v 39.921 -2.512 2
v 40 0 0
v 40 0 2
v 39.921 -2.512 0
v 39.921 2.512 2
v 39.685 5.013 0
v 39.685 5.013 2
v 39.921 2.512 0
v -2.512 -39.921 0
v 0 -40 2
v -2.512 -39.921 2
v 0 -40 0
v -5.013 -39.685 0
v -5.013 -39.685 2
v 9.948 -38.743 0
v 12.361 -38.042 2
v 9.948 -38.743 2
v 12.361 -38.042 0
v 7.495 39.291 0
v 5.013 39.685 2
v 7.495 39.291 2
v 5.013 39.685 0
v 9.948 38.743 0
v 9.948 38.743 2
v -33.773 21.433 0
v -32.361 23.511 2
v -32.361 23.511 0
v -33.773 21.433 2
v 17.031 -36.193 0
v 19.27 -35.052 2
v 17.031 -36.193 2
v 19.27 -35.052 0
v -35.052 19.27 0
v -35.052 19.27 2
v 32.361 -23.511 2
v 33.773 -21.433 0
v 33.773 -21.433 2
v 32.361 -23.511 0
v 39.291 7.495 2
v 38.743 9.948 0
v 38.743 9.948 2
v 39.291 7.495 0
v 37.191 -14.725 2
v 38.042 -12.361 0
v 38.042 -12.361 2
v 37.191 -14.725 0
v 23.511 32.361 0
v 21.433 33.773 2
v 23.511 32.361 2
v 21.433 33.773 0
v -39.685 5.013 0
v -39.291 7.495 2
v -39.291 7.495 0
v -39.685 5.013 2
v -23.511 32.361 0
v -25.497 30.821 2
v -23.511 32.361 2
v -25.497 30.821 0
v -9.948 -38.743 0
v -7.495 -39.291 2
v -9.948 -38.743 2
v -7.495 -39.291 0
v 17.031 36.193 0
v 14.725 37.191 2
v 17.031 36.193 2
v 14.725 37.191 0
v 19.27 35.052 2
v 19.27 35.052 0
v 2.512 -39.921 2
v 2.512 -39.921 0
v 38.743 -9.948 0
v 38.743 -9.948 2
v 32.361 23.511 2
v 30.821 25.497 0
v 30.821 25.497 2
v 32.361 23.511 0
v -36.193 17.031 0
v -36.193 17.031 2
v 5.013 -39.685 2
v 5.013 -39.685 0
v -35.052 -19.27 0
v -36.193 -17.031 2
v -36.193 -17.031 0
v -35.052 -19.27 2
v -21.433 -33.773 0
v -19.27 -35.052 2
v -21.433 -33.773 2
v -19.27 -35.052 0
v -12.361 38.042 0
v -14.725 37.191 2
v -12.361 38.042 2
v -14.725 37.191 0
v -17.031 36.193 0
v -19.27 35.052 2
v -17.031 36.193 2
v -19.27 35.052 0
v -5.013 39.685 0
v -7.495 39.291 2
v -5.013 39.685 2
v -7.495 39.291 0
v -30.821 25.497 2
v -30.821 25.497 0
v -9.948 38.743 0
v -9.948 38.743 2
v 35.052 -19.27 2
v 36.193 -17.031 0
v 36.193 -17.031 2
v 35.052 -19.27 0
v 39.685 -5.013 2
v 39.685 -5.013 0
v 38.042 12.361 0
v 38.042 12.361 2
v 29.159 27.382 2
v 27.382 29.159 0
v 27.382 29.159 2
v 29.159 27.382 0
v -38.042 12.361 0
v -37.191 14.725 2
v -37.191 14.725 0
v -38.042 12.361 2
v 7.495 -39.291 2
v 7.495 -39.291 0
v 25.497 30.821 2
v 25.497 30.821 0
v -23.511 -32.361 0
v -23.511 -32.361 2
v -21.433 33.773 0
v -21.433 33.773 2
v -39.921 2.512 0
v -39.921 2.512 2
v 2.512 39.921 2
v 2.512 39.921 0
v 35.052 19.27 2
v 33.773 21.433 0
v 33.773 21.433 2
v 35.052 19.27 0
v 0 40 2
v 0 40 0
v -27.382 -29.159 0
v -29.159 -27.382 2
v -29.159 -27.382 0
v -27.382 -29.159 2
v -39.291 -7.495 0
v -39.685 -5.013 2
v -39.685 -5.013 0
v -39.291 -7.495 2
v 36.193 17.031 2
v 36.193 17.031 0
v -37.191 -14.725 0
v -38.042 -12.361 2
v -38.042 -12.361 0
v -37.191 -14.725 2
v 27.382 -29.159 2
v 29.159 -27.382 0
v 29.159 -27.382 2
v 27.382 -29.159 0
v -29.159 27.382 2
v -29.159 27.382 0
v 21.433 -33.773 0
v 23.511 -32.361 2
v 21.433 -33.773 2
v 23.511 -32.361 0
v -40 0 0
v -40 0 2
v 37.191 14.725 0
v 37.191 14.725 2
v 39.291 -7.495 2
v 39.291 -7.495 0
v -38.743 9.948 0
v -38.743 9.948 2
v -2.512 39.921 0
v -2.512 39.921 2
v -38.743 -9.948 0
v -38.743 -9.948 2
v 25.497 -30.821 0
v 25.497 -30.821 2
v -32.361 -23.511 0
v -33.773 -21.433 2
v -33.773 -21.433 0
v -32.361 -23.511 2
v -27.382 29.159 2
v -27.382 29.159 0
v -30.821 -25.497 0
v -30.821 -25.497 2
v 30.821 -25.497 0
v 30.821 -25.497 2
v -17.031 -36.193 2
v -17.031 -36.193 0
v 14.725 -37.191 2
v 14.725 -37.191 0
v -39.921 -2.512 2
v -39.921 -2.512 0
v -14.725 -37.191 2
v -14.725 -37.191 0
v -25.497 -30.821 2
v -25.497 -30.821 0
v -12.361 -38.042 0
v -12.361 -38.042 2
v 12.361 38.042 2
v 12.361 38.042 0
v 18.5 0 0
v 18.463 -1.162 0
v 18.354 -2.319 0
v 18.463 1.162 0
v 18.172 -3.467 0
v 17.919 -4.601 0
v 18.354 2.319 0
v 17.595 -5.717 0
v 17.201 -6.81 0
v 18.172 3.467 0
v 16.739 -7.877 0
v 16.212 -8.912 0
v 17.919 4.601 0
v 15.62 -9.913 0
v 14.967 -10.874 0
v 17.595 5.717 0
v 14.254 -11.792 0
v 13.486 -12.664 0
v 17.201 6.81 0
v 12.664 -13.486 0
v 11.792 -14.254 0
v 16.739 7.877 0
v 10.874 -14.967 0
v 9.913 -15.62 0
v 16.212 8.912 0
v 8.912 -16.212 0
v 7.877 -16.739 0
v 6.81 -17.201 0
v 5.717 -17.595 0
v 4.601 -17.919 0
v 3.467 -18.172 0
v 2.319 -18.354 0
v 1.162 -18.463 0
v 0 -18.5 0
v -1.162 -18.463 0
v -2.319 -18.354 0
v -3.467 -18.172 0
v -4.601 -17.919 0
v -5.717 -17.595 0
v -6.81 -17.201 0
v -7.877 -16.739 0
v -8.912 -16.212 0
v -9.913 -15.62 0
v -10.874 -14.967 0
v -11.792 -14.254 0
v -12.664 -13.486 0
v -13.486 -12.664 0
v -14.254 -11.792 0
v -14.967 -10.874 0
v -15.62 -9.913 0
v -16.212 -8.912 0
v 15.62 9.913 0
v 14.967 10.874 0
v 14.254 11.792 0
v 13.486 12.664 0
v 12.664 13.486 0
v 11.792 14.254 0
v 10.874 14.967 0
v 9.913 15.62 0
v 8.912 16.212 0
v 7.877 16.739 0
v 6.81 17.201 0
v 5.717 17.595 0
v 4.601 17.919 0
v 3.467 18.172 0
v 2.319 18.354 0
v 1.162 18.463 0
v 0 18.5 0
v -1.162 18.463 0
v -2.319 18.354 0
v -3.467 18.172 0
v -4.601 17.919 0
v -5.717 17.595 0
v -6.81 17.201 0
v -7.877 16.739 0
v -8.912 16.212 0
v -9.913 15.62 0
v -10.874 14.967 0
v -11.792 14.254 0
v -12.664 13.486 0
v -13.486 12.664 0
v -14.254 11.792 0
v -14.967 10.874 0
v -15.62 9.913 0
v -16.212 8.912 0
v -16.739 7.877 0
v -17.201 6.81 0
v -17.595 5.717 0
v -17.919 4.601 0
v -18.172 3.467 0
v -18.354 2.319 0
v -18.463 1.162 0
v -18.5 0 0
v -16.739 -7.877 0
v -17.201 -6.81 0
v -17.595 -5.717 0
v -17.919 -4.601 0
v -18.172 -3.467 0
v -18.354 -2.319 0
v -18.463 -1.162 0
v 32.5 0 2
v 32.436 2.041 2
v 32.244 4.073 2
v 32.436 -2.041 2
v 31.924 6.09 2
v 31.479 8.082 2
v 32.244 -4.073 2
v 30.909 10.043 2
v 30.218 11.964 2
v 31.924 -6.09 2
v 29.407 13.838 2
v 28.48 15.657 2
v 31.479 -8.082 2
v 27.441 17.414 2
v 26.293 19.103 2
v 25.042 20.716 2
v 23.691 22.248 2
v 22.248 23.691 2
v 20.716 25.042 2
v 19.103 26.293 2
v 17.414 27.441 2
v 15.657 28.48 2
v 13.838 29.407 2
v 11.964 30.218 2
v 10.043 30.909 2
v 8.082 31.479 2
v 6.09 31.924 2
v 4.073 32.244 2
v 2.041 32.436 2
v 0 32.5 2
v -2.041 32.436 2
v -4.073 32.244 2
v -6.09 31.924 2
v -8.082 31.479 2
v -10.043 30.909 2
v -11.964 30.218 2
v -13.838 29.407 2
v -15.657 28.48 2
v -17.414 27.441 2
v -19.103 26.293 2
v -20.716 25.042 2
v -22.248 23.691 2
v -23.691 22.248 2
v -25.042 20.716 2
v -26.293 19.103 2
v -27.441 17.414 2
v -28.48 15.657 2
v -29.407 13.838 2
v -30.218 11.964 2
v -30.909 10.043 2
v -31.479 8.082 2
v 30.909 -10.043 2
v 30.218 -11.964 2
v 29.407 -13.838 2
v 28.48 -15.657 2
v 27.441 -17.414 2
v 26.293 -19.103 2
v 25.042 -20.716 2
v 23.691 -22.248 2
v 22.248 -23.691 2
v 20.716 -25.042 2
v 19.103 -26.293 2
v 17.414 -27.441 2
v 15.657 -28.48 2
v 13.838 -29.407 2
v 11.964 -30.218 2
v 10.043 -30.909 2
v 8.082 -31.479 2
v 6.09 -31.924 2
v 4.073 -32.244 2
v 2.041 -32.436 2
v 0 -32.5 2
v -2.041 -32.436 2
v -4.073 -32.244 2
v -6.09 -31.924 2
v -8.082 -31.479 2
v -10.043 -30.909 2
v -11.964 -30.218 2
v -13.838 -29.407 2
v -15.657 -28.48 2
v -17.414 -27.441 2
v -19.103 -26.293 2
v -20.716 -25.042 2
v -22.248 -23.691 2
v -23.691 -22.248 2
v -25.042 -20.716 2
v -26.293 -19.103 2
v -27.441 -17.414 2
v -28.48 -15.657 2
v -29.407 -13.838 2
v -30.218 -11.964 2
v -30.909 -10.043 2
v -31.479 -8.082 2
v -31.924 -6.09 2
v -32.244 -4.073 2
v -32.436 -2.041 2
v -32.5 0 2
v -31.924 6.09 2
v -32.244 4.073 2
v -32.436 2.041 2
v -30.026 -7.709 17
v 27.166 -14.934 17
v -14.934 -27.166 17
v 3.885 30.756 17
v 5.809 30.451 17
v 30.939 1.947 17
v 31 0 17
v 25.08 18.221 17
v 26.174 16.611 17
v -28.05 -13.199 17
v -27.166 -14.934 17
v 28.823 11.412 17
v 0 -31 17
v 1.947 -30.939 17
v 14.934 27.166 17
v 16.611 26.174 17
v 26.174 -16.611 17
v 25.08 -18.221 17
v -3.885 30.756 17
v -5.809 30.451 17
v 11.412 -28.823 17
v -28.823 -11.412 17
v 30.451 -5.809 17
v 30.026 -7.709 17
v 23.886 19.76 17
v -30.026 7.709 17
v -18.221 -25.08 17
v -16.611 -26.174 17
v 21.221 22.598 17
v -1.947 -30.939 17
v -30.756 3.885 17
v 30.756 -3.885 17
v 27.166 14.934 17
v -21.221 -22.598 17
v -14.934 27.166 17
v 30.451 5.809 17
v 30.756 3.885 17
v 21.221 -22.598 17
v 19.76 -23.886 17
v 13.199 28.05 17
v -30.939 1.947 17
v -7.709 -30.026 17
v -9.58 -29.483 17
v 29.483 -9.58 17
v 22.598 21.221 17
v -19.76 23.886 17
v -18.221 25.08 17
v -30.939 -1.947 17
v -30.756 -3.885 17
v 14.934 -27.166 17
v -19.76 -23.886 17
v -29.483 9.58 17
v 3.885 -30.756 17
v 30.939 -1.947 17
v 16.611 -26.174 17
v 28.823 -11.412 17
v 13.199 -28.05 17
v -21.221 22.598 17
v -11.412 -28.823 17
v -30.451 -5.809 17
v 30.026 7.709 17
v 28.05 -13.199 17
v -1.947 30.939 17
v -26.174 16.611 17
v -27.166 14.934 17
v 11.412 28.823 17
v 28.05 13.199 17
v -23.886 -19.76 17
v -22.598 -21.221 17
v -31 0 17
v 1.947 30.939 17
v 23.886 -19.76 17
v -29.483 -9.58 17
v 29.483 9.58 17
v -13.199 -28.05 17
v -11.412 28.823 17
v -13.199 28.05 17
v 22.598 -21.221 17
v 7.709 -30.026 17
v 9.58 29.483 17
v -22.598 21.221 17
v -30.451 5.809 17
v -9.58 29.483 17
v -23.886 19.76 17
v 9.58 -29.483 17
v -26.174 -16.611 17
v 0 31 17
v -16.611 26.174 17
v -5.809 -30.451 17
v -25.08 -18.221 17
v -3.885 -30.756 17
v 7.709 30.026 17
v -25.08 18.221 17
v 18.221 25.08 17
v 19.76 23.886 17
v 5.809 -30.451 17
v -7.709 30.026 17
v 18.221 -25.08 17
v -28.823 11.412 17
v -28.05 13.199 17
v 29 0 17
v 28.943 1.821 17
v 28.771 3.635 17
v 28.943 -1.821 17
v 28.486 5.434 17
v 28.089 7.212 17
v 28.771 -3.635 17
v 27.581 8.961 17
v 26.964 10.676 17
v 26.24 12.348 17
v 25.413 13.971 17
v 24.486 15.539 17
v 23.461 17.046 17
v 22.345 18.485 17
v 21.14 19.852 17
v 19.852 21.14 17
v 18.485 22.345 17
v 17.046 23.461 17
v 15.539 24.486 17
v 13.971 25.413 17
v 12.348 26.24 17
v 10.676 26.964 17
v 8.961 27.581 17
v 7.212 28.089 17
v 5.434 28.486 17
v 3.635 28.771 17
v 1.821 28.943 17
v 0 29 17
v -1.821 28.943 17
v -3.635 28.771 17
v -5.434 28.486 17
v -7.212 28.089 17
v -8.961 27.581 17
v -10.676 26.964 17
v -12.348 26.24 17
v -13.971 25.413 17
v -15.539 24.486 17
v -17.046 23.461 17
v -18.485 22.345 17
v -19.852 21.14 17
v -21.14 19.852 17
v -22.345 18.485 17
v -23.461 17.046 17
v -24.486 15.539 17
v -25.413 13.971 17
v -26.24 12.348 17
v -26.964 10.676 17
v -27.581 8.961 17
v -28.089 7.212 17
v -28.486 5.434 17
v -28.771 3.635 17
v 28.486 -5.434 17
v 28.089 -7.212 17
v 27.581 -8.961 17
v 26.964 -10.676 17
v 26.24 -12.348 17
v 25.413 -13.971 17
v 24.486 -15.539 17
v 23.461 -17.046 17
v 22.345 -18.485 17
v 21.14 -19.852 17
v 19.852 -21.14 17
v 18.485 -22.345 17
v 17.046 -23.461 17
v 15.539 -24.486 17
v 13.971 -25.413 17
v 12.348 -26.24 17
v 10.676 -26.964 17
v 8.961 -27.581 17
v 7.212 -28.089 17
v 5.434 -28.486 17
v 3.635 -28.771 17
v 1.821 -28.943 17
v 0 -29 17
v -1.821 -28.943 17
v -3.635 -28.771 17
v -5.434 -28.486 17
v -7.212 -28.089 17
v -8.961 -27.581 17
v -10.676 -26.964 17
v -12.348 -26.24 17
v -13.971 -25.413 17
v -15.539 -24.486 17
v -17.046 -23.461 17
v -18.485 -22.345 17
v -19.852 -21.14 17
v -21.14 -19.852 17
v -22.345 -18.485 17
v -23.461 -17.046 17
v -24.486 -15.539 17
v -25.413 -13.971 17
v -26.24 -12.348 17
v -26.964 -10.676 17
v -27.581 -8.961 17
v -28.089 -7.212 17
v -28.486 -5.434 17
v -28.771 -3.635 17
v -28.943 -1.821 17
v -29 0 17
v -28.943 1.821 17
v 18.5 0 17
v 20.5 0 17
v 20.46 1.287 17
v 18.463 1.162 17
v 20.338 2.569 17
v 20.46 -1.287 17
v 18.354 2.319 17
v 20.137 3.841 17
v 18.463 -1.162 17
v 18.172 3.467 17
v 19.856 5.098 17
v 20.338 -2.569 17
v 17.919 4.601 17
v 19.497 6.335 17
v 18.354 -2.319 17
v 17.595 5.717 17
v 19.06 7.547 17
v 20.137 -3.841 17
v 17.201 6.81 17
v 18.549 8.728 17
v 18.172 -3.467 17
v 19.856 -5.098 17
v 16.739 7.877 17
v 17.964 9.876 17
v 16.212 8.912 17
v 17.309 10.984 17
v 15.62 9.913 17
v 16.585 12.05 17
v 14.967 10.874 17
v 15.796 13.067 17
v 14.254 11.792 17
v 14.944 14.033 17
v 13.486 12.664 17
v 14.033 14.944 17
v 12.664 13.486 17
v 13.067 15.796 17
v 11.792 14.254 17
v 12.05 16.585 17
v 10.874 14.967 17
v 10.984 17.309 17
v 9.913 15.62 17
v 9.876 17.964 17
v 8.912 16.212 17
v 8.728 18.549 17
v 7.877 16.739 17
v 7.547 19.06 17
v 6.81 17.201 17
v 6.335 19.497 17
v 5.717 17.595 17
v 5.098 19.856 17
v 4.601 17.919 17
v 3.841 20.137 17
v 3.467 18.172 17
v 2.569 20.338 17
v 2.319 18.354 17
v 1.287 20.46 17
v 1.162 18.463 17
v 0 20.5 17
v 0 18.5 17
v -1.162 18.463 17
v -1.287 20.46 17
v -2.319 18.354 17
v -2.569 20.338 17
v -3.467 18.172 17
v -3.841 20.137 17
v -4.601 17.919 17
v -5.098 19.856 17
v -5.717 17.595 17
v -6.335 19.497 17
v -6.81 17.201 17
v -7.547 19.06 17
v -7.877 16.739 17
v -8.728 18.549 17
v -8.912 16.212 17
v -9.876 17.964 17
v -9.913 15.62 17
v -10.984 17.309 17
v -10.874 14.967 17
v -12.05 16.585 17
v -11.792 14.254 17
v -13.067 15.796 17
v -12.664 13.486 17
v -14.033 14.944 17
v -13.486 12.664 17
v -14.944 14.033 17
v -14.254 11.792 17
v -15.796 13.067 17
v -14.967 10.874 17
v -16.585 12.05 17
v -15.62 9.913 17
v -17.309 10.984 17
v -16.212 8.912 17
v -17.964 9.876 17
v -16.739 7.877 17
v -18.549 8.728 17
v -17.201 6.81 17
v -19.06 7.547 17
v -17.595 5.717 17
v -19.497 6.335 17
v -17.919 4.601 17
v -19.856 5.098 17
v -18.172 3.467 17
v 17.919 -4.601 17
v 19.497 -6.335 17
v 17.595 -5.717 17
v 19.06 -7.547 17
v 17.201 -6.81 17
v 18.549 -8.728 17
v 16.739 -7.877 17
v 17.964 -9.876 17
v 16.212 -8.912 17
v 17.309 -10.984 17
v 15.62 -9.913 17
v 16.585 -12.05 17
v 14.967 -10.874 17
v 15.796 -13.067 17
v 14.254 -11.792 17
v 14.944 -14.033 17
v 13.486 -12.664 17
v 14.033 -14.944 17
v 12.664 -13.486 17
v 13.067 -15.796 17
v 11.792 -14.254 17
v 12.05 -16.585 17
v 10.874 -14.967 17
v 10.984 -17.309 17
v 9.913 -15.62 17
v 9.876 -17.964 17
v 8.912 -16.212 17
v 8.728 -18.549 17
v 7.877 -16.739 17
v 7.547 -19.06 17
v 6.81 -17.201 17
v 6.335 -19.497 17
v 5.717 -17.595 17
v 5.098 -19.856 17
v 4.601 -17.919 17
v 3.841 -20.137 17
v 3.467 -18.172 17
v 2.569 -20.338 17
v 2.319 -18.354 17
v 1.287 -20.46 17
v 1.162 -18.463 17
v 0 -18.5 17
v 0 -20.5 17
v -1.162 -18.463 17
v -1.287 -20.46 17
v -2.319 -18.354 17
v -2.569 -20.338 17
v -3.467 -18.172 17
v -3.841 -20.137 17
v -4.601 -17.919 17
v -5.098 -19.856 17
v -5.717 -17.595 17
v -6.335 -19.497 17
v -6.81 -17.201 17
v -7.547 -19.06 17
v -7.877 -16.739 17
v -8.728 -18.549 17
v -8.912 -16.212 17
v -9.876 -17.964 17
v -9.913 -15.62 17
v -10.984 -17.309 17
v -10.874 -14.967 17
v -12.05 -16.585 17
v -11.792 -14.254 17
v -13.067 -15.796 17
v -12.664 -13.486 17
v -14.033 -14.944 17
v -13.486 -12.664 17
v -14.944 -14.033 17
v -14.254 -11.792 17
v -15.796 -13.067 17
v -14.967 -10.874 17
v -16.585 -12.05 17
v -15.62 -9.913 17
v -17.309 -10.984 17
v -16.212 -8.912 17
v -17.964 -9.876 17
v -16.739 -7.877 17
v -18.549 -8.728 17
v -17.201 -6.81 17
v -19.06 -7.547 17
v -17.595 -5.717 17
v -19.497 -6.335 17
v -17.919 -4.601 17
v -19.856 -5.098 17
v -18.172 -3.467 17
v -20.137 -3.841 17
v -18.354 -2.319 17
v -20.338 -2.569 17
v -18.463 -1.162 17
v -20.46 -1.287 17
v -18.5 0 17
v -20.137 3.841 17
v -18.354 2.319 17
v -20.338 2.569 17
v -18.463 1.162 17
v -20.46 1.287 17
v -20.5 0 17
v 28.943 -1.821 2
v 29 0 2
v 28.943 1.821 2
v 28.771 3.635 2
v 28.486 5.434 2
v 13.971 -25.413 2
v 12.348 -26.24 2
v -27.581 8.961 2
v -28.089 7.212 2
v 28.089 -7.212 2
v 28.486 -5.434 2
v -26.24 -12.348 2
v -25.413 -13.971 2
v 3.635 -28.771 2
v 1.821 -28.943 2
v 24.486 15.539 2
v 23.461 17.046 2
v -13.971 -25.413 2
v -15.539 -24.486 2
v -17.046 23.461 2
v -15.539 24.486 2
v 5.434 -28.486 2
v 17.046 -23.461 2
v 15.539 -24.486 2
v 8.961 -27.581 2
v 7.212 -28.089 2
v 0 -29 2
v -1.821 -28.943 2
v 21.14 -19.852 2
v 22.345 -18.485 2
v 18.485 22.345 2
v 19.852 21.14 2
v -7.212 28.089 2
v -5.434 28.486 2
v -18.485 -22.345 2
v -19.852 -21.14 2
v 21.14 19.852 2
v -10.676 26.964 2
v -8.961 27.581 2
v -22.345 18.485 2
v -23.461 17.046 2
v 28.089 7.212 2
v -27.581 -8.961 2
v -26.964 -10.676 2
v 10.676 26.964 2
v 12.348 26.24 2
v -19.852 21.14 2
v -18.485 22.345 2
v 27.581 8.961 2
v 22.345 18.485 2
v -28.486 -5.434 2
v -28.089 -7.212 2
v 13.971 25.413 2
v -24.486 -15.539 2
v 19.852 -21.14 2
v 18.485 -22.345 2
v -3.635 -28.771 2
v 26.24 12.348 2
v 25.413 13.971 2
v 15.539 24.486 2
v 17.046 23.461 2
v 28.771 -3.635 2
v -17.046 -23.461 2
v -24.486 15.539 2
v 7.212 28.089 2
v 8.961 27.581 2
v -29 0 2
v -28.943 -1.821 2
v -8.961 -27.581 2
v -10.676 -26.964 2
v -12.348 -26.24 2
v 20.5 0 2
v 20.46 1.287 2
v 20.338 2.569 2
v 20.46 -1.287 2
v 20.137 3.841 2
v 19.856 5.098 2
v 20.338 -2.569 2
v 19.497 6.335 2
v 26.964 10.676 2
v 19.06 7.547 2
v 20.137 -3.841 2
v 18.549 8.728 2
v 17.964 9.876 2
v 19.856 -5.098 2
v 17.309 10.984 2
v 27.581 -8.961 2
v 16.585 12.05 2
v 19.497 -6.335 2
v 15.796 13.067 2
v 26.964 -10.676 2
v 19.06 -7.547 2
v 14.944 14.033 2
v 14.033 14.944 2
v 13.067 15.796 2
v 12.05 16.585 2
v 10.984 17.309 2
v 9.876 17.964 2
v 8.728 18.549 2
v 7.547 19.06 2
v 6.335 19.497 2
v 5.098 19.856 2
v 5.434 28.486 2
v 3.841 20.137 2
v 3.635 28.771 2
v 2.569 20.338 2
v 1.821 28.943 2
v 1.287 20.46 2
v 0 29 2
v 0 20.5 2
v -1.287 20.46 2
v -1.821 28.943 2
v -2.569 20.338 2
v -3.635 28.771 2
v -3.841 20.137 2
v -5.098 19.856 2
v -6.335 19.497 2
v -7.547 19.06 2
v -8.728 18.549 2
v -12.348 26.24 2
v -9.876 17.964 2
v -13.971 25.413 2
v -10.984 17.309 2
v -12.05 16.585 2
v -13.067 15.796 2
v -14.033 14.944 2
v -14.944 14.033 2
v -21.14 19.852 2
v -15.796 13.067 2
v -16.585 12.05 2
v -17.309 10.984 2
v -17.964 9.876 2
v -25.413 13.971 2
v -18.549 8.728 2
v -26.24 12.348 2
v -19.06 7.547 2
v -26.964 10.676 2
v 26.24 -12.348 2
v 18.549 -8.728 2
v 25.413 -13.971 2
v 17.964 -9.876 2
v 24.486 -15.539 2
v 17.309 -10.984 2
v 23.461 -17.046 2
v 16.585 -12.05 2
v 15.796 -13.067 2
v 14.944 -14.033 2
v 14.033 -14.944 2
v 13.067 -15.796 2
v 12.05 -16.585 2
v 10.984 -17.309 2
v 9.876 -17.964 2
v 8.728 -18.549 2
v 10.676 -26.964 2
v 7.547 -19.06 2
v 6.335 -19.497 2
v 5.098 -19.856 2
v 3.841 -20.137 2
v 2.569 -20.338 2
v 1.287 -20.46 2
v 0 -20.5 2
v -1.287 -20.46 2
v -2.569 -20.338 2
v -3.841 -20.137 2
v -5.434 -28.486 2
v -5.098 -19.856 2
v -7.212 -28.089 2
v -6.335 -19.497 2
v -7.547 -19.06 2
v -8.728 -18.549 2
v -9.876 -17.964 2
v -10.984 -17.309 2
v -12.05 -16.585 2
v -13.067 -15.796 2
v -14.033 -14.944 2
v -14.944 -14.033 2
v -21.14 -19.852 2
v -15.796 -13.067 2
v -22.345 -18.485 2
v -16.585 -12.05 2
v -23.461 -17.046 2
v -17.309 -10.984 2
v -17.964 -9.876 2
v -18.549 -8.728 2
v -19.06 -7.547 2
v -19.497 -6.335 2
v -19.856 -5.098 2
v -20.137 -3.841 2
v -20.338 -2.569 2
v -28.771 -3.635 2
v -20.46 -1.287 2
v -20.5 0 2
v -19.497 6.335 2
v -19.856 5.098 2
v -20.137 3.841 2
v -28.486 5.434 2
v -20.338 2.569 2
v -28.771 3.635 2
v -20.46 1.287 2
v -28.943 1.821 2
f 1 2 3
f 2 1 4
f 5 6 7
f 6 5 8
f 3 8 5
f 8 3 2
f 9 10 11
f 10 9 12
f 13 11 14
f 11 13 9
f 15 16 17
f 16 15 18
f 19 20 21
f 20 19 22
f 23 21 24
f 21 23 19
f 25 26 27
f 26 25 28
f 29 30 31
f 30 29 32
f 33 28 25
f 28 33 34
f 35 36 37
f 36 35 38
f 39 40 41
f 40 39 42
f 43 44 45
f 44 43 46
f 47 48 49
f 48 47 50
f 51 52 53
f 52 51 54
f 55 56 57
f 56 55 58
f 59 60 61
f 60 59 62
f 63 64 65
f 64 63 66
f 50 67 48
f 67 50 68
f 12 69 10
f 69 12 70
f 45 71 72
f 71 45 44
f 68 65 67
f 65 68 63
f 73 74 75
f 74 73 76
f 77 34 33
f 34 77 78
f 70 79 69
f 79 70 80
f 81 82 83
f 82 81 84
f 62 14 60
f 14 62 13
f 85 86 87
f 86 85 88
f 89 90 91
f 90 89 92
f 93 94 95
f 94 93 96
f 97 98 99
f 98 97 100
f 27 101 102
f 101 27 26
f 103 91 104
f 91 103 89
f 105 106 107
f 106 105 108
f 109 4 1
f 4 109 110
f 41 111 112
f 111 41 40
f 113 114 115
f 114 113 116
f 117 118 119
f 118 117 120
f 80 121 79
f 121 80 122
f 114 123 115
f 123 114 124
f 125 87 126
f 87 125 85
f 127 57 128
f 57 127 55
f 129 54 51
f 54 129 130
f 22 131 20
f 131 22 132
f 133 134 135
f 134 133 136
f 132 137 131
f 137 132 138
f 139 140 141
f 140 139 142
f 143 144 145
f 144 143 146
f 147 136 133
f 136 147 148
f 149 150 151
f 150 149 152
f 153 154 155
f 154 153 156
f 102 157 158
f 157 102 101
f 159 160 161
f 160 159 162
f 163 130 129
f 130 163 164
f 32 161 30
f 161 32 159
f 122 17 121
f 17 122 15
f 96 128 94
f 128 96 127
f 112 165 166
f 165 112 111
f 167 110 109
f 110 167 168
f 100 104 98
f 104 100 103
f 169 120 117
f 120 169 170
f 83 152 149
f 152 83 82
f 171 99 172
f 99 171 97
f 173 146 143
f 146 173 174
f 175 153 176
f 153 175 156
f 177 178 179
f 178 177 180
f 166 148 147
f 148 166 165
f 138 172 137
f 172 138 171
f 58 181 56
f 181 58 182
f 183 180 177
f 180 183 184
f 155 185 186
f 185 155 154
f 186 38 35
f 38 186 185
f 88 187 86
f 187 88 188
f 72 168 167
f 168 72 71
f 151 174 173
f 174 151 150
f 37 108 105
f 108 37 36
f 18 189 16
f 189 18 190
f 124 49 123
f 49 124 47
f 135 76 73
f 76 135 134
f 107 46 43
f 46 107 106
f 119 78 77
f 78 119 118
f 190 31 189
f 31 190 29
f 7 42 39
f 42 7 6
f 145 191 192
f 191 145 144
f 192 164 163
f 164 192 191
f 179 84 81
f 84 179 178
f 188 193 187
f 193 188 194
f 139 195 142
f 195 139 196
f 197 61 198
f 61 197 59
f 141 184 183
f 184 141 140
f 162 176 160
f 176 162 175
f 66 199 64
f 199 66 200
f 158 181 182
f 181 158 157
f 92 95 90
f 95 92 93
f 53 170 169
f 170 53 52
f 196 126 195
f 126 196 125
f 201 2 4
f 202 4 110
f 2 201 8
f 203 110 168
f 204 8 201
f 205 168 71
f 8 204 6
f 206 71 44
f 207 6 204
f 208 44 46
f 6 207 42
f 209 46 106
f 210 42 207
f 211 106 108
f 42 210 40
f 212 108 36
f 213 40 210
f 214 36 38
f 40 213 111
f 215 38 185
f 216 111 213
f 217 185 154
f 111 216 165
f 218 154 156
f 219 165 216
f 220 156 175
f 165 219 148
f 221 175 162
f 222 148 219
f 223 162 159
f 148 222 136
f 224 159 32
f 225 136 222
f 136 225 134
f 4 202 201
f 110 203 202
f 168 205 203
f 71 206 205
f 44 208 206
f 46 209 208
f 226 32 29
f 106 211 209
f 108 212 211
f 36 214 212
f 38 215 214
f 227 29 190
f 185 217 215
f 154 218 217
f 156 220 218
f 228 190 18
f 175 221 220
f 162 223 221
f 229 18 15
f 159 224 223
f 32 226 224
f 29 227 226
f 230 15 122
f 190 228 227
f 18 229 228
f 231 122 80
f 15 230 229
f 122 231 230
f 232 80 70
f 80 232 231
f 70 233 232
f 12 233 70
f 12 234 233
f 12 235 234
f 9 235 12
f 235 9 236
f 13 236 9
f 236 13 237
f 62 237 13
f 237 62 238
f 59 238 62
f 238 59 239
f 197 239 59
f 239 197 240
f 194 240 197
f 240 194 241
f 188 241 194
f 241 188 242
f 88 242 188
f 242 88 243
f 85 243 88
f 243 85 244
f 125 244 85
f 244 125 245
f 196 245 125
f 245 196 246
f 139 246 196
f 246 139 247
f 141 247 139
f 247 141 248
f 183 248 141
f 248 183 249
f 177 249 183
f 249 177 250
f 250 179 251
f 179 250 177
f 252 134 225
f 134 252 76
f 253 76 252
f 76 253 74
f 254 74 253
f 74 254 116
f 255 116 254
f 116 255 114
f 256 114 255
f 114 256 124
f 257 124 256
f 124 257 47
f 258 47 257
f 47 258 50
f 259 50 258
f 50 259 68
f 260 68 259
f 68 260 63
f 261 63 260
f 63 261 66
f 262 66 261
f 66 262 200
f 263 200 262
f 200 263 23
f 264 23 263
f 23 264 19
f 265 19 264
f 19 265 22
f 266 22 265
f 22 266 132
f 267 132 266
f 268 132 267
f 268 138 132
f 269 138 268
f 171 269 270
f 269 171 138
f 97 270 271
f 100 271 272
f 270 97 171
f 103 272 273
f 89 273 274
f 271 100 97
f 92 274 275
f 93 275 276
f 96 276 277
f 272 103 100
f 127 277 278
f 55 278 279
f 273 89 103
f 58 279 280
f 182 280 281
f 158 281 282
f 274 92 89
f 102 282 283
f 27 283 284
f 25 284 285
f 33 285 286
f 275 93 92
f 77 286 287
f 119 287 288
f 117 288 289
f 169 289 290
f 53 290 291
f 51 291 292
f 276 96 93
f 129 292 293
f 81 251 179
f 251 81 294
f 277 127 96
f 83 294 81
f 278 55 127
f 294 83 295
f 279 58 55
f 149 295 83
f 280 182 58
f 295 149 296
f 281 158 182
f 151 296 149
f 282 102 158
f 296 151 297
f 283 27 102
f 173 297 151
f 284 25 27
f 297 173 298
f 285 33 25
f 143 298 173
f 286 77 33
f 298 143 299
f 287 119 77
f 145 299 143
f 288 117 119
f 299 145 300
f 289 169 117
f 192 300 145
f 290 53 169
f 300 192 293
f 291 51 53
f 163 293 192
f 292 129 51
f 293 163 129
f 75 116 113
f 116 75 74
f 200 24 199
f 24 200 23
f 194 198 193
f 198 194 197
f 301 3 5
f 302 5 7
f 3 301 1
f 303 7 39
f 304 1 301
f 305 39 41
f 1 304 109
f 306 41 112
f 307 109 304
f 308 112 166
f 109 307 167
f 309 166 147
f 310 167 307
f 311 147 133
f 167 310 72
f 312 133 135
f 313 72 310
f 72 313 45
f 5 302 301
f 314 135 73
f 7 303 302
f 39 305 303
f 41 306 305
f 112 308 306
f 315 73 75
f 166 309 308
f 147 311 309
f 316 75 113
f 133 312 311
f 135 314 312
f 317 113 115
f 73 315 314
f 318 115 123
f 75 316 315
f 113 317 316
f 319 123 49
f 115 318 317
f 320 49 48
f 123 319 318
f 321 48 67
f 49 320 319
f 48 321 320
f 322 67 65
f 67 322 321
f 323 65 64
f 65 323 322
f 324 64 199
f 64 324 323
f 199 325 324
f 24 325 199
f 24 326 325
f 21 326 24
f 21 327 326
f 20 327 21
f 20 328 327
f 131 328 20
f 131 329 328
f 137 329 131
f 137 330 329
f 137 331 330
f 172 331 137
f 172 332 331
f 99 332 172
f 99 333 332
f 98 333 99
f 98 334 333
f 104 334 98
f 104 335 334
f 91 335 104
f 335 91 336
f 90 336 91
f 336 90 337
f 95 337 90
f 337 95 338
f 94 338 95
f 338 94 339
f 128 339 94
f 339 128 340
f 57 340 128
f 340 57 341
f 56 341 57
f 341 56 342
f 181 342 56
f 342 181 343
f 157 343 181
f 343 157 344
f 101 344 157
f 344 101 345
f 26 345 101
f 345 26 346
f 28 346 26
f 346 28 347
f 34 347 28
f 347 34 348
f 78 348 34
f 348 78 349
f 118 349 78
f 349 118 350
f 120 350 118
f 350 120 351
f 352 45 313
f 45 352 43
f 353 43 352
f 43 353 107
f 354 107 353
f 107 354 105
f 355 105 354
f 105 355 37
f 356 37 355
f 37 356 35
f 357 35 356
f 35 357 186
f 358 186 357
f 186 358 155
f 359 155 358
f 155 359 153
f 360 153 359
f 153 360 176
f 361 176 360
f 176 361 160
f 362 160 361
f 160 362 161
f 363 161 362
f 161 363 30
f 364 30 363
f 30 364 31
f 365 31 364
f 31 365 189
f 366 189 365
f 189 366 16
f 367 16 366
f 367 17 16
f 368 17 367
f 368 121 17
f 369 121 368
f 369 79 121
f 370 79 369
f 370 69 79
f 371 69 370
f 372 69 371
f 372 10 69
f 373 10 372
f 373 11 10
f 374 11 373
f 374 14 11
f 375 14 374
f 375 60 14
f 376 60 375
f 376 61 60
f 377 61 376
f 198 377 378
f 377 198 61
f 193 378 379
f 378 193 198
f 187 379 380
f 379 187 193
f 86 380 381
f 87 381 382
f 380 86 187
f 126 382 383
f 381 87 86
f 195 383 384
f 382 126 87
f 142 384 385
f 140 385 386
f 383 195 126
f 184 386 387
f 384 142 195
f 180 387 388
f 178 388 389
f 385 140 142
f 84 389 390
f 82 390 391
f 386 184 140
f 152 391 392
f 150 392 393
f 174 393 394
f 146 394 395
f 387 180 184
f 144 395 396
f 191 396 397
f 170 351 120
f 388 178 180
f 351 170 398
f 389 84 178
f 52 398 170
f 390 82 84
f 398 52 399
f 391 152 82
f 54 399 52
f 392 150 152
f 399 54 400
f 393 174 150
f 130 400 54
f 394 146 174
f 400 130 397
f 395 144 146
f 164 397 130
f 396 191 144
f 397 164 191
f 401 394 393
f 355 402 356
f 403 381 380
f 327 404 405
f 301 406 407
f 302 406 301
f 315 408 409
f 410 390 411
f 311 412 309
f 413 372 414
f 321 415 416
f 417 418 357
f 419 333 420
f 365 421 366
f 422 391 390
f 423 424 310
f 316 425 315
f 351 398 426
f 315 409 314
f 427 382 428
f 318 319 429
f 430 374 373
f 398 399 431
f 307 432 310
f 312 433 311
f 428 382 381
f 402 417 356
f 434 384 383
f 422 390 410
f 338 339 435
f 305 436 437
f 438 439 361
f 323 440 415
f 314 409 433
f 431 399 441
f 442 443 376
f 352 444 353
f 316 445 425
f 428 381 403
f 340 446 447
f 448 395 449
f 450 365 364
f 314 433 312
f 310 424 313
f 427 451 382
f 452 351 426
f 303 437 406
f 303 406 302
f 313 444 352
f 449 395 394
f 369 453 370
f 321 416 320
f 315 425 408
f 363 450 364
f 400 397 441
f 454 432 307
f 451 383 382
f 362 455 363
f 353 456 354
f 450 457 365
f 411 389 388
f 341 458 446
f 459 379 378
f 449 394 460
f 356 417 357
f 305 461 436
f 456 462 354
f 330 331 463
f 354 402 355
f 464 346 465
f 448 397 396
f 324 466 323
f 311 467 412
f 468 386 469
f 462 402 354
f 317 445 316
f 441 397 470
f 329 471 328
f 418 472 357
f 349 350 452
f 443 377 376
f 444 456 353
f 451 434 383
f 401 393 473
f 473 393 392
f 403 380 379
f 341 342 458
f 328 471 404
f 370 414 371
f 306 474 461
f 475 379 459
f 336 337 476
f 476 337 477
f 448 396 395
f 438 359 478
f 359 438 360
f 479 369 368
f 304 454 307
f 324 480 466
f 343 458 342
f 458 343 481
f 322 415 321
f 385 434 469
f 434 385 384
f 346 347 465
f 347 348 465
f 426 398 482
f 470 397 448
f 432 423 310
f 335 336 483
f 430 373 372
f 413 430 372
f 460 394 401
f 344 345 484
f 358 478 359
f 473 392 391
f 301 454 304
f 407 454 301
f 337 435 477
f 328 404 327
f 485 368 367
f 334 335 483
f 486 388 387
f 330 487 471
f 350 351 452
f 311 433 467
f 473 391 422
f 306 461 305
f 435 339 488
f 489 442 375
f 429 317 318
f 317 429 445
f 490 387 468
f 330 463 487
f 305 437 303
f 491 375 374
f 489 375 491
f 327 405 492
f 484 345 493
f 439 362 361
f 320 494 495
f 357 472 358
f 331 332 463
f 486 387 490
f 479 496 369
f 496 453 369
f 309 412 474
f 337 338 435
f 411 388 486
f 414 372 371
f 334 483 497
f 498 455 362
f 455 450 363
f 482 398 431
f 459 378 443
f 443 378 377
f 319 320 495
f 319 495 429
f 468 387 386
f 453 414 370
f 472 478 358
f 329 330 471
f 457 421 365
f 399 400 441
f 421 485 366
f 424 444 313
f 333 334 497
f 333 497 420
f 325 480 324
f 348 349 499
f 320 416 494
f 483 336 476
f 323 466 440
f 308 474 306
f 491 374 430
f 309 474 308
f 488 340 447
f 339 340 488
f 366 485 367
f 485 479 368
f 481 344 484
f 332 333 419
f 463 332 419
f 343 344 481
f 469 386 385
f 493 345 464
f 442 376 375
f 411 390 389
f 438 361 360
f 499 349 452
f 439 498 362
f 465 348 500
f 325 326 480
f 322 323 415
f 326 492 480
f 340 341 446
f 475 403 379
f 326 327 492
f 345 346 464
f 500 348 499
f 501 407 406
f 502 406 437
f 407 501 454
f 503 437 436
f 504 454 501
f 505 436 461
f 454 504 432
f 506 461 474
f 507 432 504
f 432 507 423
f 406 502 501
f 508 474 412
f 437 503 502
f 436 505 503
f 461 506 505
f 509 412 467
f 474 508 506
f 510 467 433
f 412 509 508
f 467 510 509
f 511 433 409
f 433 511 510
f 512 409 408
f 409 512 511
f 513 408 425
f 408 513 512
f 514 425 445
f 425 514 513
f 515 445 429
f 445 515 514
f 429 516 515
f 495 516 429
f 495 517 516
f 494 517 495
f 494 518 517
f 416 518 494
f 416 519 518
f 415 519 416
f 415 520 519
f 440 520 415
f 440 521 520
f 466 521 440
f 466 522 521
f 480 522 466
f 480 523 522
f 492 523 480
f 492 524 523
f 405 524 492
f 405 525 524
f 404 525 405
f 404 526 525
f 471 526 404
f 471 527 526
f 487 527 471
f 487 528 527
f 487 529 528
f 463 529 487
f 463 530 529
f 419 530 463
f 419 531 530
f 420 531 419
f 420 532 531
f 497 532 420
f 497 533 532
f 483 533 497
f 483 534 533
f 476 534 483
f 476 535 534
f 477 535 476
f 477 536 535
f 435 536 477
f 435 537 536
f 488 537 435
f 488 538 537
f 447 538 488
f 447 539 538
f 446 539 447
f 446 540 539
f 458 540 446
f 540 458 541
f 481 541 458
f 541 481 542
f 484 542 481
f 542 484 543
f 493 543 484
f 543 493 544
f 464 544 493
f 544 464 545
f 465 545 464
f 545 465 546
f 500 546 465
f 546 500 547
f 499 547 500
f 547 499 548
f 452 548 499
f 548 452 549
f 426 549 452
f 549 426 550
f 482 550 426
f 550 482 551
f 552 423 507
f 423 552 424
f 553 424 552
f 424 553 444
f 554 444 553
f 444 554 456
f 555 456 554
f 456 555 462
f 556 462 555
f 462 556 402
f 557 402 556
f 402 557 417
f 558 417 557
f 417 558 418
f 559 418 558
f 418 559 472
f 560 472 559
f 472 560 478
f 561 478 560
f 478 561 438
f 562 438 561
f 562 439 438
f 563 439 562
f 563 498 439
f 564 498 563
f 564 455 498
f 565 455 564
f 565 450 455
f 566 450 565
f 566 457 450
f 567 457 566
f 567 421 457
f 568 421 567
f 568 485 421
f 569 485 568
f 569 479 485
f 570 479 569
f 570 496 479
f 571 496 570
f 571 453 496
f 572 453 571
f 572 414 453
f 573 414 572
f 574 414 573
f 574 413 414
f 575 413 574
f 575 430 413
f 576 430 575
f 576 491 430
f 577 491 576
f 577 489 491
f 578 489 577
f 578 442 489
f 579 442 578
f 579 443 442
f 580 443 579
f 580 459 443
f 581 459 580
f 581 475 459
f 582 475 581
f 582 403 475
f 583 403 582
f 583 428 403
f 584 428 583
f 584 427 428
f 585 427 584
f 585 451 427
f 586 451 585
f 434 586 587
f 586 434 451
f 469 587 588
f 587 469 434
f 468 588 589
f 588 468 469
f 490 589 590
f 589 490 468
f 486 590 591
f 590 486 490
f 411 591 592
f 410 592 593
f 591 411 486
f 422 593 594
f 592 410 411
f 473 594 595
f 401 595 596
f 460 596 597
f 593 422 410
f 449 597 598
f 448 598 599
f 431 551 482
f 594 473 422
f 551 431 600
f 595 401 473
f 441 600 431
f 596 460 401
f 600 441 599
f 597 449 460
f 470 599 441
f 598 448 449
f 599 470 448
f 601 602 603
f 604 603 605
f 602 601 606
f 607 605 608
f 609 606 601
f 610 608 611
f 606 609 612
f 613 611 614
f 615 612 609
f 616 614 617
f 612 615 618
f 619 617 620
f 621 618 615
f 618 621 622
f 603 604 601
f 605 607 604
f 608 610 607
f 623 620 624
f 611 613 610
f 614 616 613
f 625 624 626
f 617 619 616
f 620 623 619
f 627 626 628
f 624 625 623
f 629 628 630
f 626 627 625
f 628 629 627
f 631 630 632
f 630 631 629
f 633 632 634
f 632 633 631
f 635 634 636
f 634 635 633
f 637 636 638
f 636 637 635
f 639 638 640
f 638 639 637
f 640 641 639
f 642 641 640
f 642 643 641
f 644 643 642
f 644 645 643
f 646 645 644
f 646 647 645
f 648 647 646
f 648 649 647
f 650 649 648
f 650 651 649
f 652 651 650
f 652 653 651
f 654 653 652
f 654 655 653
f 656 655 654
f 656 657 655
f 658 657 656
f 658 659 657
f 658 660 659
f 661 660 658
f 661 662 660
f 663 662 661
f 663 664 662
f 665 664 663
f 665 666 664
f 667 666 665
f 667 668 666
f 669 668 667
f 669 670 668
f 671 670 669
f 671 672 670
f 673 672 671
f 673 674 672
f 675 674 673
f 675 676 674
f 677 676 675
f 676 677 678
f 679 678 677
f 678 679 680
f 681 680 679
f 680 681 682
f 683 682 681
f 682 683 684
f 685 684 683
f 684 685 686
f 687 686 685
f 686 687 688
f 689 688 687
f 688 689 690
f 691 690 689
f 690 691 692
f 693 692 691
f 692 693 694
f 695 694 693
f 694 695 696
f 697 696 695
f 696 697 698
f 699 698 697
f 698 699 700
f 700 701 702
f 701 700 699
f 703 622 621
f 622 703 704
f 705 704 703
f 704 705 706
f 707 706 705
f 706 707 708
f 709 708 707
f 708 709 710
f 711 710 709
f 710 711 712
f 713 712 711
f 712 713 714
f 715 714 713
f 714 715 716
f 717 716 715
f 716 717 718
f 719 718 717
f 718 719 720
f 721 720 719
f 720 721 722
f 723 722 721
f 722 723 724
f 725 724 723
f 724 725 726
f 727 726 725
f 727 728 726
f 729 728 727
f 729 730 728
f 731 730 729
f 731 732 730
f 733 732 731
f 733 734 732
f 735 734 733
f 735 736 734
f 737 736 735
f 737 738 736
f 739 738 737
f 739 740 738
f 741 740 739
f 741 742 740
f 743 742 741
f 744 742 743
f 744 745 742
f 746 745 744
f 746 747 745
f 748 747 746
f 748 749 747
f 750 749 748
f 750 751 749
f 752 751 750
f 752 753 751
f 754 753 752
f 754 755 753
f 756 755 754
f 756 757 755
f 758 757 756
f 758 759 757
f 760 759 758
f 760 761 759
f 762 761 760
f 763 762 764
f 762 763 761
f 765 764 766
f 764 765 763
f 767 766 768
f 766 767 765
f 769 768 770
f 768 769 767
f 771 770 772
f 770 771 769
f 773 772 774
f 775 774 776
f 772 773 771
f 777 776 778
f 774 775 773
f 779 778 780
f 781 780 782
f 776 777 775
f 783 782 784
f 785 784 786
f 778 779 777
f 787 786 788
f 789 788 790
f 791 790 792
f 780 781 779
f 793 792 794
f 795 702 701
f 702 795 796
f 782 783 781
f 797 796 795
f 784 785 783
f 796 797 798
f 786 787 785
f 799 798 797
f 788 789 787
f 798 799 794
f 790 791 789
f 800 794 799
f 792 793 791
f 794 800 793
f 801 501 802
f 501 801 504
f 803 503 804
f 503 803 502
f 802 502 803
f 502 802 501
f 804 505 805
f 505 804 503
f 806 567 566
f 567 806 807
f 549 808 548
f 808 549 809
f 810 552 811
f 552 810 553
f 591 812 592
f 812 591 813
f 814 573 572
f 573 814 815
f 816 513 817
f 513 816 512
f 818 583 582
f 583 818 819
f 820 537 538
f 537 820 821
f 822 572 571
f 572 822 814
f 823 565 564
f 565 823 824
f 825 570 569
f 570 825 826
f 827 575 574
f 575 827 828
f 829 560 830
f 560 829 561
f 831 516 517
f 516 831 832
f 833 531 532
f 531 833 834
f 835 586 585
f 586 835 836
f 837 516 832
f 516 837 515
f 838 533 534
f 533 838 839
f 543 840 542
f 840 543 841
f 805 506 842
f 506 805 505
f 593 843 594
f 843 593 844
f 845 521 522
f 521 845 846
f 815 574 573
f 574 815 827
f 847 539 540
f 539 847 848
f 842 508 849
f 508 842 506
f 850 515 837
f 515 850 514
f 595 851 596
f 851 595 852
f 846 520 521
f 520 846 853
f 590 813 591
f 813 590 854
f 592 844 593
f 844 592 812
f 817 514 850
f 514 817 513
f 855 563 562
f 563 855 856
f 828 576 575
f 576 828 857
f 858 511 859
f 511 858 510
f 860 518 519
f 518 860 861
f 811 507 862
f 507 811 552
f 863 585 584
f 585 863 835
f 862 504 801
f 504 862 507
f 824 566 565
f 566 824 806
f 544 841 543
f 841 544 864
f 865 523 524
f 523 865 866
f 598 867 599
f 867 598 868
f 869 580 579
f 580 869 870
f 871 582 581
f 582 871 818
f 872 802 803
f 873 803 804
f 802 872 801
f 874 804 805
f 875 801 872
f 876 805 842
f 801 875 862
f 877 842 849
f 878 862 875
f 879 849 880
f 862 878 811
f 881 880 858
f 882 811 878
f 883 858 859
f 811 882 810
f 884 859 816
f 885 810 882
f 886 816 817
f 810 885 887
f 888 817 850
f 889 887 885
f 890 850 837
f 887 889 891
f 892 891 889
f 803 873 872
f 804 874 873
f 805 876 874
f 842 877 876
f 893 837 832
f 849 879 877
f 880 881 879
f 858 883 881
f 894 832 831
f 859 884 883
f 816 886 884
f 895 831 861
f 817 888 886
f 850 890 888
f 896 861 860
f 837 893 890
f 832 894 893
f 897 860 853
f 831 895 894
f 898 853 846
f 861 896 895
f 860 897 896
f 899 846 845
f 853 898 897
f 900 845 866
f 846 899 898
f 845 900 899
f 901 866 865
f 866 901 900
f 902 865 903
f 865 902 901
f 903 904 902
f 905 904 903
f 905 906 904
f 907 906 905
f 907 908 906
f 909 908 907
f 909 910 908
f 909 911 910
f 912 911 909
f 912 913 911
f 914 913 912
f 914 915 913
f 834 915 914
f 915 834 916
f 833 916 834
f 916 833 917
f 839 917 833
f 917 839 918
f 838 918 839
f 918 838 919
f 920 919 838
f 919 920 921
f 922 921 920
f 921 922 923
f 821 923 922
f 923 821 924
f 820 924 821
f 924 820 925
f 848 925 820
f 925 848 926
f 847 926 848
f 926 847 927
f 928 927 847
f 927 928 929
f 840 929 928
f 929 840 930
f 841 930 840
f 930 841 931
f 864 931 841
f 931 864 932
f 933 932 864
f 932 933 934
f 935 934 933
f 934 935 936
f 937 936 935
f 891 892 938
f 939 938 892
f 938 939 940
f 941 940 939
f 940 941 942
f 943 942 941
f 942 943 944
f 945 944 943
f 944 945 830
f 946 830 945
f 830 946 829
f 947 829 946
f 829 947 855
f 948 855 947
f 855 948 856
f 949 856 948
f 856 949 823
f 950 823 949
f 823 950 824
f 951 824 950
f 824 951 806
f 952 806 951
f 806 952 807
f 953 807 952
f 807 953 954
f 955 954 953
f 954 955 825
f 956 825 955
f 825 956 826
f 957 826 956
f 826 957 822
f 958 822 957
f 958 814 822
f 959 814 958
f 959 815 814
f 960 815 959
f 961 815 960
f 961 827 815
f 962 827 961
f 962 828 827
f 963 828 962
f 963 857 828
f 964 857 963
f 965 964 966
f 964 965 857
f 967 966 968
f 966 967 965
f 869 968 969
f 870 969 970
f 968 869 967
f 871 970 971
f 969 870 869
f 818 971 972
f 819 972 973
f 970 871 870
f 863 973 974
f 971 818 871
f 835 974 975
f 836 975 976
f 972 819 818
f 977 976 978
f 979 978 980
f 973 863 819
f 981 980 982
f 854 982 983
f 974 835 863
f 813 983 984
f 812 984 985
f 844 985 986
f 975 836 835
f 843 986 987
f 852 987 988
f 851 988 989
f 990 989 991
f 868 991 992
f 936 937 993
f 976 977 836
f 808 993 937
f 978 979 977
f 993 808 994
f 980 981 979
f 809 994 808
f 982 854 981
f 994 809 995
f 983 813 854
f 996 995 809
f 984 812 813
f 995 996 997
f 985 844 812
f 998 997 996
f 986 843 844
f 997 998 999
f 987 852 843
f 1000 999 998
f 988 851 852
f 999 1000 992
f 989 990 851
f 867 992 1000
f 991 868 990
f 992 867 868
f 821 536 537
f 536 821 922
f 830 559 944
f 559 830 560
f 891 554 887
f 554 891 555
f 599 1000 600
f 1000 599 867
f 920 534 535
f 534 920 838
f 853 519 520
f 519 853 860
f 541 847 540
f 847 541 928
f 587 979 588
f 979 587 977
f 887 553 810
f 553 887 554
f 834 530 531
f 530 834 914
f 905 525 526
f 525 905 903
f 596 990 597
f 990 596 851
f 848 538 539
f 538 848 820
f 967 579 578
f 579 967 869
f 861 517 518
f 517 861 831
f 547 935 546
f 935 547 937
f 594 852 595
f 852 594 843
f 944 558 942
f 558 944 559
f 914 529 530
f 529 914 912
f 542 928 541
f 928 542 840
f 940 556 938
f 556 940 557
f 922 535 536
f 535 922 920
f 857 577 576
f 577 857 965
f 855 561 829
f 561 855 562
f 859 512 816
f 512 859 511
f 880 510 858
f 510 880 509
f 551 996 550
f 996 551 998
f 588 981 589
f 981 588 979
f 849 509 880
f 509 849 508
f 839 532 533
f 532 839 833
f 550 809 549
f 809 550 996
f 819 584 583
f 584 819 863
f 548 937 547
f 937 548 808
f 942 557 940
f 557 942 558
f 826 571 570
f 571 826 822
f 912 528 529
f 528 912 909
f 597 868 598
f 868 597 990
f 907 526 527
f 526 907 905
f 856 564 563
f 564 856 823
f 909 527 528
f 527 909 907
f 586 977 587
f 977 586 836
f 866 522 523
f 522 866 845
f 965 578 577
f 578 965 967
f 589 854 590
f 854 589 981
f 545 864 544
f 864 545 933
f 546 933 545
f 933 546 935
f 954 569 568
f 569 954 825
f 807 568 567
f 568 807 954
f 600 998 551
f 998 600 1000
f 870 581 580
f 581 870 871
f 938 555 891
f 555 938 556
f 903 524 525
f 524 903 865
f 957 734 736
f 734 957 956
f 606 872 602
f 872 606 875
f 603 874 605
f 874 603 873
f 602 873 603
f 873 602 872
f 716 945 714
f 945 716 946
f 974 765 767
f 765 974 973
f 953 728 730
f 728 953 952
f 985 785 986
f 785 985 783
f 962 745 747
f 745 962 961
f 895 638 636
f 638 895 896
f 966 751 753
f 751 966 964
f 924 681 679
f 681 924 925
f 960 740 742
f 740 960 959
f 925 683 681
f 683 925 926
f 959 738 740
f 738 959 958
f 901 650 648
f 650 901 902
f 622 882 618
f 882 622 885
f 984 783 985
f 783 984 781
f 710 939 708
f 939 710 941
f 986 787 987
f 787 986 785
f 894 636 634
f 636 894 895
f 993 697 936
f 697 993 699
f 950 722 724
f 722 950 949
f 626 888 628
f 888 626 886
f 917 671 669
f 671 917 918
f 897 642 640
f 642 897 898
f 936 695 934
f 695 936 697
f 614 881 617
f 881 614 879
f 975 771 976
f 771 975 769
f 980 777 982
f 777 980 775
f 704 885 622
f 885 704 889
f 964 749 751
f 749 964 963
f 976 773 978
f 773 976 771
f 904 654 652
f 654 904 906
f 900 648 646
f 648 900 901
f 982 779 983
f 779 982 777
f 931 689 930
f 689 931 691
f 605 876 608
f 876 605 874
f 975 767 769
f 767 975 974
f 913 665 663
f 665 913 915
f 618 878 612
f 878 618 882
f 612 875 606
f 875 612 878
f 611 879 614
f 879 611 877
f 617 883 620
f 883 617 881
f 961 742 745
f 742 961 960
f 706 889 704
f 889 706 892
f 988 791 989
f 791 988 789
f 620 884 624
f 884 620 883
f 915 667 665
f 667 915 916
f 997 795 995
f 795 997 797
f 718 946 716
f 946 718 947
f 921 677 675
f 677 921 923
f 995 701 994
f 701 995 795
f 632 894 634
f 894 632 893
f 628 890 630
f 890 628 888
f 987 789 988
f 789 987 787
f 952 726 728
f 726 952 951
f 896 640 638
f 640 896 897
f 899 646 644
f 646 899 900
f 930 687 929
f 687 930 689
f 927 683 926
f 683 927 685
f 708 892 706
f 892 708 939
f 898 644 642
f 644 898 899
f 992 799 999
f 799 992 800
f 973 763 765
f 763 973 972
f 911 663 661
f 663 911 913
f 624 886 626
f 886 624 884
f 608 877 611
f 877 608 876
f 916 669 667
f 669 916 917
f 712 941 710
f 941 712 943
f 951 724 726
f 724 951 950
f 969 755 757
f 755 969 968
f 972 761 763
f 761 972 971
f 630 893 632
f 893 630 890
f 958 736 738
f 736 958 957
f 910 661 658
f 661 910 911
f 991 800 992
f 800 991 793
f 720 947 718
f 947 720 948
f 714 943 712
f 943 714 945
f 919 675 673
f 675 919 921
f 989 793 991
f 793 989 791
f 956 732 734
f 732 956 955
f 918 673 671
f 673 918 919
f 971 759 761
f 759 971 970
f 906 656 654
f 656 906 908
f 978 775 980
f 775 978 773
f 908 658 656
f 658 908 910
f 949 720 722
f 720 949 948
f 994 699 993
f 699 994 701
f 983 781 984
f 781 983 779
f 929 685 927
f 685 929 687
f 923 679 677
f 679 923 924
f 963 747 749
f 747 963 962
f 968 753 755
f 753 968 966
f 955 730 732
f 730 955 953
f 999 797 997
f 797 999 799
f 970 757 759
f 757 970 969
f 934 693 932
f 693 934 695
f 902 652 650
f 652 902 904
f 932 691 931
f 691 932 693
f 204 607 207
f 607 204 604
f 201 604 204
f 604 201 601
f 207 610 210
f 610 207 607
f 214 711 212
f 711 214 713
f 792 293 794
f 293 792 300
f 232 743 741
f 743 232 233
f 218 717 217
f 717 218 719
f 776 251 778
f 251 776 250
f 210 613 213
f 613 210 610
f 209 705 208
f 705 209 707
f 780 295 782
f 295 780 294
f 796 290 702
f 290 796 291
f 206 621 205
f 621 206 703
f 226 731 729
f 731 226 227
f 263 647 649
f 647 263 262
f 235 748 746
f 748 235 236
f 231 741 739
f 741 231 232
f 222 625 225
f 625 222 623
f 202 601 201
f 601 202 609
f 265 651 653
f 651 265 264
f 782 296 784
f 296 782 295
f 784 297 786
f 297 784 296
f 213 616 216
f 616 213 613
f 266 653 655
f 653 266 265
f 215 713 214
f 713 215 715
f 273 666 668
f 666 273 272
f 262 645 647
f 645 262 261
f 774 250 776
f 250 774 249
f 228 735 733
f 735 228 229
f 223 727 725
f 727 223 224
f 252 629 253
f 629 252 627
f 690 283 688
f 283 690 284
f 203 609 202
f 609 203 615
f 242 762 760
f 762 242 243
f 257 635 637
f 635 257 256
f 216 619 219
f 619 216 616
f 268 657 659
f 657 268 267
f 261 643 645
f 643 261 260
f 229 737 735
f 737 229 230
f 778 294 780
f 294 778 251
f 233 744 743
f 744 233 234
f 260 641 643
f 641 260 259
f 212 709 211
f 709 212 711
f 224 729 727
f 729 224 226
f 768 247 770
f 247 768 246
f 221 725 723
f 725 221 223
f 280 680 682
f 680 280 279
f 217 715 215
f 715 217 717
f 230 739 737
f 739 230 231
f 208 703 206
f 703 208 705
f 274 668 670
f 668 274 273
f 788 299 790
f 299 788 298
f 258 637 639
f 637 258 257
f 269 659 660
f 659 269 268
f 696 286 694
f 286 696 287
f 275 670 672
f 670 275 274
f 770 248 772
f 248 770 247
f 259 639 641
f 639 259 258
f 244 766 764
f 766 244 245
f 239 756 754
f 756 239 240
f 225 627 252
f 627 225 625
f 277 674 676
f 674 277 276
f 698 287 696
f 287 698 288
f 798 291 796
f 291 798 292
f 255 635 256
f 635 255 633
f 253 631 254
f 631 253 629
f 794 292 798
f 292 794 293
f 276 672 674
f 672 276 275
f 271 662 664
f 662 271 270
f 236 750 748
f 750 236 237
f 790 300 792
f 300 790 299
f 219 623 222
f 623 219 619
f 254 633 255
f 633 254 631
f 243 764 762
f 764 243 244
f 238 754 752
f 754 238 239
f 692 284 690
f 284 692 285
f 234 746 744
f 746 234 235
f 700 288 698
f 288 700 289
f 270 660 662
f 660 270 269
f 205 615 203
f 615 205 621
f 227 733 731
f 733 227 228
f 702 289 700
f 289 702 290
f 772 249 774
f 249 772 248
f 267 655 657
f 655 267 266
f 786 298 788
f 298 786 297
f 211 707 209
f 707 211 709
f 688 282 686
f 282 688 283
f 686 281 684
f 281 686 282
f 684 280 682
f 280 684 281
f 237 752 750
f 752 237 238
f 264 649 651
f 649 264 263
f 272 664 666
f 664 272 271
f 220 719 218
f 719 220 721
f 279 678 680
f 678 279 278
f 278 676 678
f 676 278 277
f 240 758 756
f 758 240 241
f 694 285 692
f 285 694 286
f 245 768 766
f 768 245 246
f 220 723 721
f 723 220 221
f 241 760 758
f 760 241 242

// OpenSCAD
THICKNESS = 2; // 2.5;

BEARING_INNER_DIA = 12.75;
BEARING_OUTER_DIA = 37;
BEARING_THICKNESS = 12;

BASE_DIA = 150;
BASE_SPOKES = 3;
BASE_SPOKE_DIA = 18;
BASE_THICKNESS = THICKNESS;

HOLDER_OUTER_DIA = 80; //70; // 90; // 70;
HOLDER_INNER_DIA_BOT = 65; //50; //75; // 53;
HOLDER_INNER_DIA_TOP = 62; //48; // 72; // 50;
HOLDER_THICKNESS = 15;

$fn = 100;

module base() {
  for(i = [0:BASE_SPOKES-1]) {
    rotate([0, 0, i * 360/BASE_SPOKES])
    hull() {
      translate([0, (BASE_DIA - BASE_SPOKE_DIA)/2, 0])
      cylinder(d = BASE_SPOKE_DIA, h = BASE_THICKNESS);
      cylinder(d = BASE_SPOKE_DIA, h = BASE_THICKNESS);
    }
  }

  cylinder(d = BASE_SPOKE_DIA, h = 2 * BASE_THICKNESS);

  cylinder(d1 = BEARING_INNER_DIA, d2 = BEARING_INNER_DIA - 1, h = 2 * BASE_THICKNESS + BEARING_THICKNESS);
}

module holder() {
  difference() {
    union() {
      cylinder(d = HOLDER_OUTER_DIA, h = THICKNESS);
      translate([0, 0, BASE_THICKNESS])
      cylinder(d1 = HOLDER_INNER_DIA_BOT, d2 = HOLDER_INNER_DIA_TOP, h = HOLDER_THICKNESS);
    }

    #if(HOLDER_INNER_DIA_TOP - BEARING_OUTER_DIA > 6 * THICKNESS) {
      translate([0, 0, THICKNESS])
      difference() {
        cylinder(d = HOLDER_INNER_DIA_TOP - 2 * THICKNESS, h = HOLDER_THICKNESS);
        cylinder(d = BEARING_OUTER_DIA + 2 * THICKNESS, h = max(HOLDER_THICKNESS, BEARING_THICKNESS));
      }
    }
    cylinder(d = BEARING_OUTER_DIA, h = BASE_THICKNESS + max(HOLDER_THICKNESS, BEARING_THICKNESS));
  }
}

base();
translate([0, 0, 2 * BASE_THICKNESS])
!holder();
